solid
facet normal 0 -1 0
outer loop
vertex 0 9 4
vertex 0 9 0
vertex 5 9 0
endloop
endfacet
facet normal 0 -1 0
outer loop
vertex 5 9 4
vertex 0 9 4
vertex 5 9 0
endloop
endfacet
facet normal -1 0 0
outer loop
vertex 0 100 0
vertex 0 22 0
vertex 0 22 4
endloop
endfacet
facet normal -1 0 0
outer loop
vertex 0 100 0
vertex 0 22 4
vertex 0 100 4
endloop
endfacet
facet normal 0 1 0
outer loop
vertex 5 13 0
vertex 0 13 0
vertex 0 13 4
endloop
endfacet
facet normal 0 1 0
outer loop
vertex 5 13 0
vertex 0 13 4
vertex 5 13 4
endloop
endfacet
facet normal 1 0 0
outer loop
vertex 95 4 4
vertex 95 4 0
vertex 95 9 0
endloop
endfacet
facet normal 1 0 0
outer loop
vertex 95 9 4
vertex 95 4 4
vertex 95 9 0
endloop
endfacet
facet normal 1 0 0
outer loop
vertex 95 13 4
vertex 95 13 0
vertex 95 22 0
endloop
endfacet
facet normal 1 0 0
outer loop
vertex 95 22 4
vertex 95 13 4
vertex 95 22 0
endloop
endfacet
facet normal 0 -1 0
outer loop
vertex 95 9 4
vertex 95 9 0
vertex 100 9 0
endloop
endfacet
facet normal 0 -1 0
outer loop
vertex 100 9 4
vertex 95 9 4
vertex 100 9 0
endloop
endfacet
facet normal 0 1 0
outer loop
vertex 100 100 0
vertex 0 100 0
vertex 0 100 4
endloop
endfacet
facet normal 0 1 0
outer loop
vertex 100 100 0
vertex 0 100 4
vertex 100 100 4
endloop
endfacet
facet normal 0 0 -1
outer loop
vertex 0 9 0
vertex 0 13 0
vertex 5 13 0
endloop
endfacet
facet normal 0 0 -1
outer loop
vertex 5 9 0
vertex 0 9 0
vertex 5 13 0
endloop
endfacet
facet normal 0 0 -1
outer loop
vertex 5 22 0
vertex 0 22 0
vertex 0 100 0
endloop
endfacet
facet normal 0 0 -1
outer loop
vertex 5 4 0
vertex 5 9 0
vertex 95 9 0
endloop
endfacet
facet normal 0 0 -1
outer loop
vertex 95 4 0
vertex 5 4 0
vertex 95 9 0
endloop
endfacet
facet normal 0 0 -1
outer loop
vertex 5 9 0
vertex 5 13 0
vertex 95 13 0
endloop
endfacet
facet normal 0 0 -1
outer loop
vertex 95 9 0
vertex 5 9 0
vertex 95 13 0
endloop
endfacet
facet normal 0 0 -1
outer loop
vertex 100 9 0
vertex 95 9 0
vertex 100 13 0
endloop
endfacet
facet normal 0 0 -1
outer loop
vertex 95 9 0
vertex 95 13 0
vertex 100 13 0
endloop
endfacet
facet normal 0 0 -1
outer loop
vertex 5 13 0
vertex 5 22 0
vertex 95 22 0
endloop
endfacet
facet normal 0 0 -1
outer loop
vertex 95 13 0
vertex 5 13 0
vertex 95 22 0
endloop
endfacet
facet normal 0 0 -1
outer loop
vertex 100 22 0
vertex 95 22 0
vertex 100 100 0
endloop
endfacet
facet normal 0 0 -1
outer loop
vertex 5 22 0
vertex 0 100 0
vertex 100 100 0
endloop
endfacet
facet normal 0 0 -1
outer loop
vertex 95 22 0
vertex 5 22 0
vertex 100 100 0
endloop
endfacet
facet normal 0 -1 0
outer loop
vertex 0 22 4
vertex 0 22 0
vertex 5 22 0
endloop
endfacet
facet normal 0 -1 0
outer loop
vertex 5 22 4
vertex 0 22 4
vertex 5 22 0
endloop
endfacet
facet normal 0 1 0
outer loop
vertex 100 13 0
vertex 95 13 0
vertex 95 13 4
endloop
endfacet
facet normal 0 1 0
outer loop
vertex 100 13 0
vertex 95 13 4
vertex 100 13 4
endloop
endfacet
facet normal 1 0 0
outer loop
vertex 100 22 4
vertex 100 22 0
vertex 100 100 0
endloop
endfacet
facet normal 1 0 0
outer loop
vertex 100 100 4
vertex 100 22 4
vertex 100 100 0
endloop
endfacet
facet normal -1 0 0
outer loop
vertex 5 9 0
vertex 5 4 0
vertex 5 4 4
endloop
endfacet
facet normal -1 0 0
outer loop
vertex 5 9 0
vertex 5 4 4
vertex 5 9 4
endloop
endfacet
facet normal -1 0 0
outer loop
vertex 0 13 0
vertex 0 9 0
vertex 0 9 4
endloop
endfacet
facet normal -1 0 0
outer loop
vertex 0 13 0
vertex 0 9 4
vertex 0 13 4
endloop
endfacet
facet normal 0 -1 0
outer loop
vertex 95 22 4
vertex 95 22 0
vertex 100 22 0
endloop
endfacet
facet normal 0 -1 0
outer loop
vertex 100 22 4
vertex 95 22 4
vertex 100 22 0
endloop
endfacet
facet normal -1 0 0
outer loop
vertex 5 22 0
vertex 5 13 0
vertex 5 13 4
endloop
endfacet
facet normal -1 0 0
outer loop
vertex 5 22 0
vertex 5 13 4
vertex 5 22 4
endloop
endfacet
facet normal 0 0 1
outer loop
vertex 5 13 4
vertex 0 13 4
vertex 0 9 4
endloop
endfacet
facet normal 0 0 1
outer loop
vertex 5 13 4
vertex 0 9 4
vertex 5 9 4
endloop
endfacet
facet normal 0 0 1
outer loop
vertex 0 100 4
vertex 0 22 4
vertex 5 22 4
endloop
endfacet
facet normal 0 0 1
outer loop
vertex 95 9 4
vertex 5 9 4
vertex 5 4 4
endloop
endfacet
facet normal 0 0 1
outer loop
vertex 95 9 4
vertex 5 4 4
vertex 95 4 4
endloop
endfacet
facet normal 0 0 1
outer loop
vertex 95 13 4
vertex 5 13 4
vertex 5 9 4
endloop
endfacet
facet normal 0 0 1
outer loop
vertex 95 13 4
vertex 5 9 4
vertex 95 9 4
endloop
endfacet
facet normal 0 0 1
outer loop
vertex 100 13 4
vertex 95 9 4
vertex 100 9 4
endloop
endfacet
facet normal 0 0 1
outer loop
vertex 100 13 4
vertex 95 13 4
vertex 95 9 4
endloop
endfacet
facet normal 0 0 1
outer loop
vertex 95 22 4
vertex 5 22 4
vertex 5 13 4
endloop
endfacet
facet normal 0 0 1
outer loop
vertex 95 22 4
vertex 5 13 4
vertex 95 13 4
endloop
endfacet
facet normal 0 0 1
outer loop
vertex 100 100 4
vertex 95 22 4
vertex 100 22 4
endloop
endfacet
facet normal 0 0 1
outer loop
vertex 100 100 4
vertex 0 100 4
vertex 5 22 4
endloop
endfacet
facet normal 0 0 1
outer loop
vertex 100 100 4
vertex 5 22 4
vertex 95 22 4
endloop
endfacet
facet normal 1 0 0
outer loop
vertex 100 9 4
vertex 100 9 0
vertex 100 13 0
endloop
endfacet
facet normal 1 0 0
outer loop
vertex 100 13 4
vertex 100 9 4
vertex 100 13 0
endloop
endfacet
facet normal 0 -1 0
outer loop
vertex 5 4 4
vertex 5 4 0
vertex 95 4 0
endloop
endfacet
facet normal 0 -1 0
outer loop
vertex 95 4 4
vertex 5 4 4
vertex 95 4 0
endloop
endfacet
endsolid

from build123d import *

# Parameters (mm, degrees)
F0_W      = 100
F0_H      = 100
F1_DEPTH  = 4
F2_W      = 5
F2_H      = 22
F3_DEPTH  = 4
F4_W      = 10
F4_H      = 4
F5_DEPTH  = 4
F6_W      = 5
F6_H      = 4
F7_DEPTH  = 4
F8_W      = 5
F8_H      = 4
F9_DEPTH  = 4
F10_W     = 90
F10_H     = 4
F11_DEPTH = 4


with BuildPart() as f1:
    # F0 (on Top) → F1 (new body)
    with BuildSketch(Plane.XY):
        with Locations((50, 50)):
            Rectangle(F0_W, F0_H)
    extrude(amount=F1_DEPTH)

    # F2 (on Top) → F3 (cut)
    with BuildSketch(Plane.XY):
        with Locations((2.5, 11)):
            Rectangle(F2_W, F2_H)
        with Locations((97.5, 11)):
            Rectangle(F2_W, F2_H)
    extrude(amount=F3_DEPTH, mode=Mode.SUBTRACT)

    # F4 (on Top) → F5 (join)
    with BuildSketch(Plane.XY):
        with Locations((0, 11)):
            Rectangle(F4_W, F4_H)
        with Locations((100, 11)):
            Rectangle(F4_W, F4_H)
    extrude(amount=F5_DEPTH)

    # F6 (on Top) → F7 (cut)
    with BuildSketch(Plane.XY):
        with Locations((-2.5, 11)):
            Rectangle(F6_W, F6_H)
    extrude(amount=F7_DEPTH, mode=Mode.SUBTRACT)

    # F8 (on Top) → F9 (cut)
    with BuildSketch(Plane.XY):
        with Locations((102.5, 11)):
            Rectangle(F8_W, F8_H)
    extrude(amount=F9_DEPTH, mode=Mode.SUBTRACT)

    # F10 (on Top) → F11 (cut)
    with BuildSketch(Plane.XY):
        with Locations((50, 2)):
            Rectangle(F10_W, F10_H)
    extrude(amount=F11_DEPTH, mode=Mode.SUBTRACT)


solid = f1.part
